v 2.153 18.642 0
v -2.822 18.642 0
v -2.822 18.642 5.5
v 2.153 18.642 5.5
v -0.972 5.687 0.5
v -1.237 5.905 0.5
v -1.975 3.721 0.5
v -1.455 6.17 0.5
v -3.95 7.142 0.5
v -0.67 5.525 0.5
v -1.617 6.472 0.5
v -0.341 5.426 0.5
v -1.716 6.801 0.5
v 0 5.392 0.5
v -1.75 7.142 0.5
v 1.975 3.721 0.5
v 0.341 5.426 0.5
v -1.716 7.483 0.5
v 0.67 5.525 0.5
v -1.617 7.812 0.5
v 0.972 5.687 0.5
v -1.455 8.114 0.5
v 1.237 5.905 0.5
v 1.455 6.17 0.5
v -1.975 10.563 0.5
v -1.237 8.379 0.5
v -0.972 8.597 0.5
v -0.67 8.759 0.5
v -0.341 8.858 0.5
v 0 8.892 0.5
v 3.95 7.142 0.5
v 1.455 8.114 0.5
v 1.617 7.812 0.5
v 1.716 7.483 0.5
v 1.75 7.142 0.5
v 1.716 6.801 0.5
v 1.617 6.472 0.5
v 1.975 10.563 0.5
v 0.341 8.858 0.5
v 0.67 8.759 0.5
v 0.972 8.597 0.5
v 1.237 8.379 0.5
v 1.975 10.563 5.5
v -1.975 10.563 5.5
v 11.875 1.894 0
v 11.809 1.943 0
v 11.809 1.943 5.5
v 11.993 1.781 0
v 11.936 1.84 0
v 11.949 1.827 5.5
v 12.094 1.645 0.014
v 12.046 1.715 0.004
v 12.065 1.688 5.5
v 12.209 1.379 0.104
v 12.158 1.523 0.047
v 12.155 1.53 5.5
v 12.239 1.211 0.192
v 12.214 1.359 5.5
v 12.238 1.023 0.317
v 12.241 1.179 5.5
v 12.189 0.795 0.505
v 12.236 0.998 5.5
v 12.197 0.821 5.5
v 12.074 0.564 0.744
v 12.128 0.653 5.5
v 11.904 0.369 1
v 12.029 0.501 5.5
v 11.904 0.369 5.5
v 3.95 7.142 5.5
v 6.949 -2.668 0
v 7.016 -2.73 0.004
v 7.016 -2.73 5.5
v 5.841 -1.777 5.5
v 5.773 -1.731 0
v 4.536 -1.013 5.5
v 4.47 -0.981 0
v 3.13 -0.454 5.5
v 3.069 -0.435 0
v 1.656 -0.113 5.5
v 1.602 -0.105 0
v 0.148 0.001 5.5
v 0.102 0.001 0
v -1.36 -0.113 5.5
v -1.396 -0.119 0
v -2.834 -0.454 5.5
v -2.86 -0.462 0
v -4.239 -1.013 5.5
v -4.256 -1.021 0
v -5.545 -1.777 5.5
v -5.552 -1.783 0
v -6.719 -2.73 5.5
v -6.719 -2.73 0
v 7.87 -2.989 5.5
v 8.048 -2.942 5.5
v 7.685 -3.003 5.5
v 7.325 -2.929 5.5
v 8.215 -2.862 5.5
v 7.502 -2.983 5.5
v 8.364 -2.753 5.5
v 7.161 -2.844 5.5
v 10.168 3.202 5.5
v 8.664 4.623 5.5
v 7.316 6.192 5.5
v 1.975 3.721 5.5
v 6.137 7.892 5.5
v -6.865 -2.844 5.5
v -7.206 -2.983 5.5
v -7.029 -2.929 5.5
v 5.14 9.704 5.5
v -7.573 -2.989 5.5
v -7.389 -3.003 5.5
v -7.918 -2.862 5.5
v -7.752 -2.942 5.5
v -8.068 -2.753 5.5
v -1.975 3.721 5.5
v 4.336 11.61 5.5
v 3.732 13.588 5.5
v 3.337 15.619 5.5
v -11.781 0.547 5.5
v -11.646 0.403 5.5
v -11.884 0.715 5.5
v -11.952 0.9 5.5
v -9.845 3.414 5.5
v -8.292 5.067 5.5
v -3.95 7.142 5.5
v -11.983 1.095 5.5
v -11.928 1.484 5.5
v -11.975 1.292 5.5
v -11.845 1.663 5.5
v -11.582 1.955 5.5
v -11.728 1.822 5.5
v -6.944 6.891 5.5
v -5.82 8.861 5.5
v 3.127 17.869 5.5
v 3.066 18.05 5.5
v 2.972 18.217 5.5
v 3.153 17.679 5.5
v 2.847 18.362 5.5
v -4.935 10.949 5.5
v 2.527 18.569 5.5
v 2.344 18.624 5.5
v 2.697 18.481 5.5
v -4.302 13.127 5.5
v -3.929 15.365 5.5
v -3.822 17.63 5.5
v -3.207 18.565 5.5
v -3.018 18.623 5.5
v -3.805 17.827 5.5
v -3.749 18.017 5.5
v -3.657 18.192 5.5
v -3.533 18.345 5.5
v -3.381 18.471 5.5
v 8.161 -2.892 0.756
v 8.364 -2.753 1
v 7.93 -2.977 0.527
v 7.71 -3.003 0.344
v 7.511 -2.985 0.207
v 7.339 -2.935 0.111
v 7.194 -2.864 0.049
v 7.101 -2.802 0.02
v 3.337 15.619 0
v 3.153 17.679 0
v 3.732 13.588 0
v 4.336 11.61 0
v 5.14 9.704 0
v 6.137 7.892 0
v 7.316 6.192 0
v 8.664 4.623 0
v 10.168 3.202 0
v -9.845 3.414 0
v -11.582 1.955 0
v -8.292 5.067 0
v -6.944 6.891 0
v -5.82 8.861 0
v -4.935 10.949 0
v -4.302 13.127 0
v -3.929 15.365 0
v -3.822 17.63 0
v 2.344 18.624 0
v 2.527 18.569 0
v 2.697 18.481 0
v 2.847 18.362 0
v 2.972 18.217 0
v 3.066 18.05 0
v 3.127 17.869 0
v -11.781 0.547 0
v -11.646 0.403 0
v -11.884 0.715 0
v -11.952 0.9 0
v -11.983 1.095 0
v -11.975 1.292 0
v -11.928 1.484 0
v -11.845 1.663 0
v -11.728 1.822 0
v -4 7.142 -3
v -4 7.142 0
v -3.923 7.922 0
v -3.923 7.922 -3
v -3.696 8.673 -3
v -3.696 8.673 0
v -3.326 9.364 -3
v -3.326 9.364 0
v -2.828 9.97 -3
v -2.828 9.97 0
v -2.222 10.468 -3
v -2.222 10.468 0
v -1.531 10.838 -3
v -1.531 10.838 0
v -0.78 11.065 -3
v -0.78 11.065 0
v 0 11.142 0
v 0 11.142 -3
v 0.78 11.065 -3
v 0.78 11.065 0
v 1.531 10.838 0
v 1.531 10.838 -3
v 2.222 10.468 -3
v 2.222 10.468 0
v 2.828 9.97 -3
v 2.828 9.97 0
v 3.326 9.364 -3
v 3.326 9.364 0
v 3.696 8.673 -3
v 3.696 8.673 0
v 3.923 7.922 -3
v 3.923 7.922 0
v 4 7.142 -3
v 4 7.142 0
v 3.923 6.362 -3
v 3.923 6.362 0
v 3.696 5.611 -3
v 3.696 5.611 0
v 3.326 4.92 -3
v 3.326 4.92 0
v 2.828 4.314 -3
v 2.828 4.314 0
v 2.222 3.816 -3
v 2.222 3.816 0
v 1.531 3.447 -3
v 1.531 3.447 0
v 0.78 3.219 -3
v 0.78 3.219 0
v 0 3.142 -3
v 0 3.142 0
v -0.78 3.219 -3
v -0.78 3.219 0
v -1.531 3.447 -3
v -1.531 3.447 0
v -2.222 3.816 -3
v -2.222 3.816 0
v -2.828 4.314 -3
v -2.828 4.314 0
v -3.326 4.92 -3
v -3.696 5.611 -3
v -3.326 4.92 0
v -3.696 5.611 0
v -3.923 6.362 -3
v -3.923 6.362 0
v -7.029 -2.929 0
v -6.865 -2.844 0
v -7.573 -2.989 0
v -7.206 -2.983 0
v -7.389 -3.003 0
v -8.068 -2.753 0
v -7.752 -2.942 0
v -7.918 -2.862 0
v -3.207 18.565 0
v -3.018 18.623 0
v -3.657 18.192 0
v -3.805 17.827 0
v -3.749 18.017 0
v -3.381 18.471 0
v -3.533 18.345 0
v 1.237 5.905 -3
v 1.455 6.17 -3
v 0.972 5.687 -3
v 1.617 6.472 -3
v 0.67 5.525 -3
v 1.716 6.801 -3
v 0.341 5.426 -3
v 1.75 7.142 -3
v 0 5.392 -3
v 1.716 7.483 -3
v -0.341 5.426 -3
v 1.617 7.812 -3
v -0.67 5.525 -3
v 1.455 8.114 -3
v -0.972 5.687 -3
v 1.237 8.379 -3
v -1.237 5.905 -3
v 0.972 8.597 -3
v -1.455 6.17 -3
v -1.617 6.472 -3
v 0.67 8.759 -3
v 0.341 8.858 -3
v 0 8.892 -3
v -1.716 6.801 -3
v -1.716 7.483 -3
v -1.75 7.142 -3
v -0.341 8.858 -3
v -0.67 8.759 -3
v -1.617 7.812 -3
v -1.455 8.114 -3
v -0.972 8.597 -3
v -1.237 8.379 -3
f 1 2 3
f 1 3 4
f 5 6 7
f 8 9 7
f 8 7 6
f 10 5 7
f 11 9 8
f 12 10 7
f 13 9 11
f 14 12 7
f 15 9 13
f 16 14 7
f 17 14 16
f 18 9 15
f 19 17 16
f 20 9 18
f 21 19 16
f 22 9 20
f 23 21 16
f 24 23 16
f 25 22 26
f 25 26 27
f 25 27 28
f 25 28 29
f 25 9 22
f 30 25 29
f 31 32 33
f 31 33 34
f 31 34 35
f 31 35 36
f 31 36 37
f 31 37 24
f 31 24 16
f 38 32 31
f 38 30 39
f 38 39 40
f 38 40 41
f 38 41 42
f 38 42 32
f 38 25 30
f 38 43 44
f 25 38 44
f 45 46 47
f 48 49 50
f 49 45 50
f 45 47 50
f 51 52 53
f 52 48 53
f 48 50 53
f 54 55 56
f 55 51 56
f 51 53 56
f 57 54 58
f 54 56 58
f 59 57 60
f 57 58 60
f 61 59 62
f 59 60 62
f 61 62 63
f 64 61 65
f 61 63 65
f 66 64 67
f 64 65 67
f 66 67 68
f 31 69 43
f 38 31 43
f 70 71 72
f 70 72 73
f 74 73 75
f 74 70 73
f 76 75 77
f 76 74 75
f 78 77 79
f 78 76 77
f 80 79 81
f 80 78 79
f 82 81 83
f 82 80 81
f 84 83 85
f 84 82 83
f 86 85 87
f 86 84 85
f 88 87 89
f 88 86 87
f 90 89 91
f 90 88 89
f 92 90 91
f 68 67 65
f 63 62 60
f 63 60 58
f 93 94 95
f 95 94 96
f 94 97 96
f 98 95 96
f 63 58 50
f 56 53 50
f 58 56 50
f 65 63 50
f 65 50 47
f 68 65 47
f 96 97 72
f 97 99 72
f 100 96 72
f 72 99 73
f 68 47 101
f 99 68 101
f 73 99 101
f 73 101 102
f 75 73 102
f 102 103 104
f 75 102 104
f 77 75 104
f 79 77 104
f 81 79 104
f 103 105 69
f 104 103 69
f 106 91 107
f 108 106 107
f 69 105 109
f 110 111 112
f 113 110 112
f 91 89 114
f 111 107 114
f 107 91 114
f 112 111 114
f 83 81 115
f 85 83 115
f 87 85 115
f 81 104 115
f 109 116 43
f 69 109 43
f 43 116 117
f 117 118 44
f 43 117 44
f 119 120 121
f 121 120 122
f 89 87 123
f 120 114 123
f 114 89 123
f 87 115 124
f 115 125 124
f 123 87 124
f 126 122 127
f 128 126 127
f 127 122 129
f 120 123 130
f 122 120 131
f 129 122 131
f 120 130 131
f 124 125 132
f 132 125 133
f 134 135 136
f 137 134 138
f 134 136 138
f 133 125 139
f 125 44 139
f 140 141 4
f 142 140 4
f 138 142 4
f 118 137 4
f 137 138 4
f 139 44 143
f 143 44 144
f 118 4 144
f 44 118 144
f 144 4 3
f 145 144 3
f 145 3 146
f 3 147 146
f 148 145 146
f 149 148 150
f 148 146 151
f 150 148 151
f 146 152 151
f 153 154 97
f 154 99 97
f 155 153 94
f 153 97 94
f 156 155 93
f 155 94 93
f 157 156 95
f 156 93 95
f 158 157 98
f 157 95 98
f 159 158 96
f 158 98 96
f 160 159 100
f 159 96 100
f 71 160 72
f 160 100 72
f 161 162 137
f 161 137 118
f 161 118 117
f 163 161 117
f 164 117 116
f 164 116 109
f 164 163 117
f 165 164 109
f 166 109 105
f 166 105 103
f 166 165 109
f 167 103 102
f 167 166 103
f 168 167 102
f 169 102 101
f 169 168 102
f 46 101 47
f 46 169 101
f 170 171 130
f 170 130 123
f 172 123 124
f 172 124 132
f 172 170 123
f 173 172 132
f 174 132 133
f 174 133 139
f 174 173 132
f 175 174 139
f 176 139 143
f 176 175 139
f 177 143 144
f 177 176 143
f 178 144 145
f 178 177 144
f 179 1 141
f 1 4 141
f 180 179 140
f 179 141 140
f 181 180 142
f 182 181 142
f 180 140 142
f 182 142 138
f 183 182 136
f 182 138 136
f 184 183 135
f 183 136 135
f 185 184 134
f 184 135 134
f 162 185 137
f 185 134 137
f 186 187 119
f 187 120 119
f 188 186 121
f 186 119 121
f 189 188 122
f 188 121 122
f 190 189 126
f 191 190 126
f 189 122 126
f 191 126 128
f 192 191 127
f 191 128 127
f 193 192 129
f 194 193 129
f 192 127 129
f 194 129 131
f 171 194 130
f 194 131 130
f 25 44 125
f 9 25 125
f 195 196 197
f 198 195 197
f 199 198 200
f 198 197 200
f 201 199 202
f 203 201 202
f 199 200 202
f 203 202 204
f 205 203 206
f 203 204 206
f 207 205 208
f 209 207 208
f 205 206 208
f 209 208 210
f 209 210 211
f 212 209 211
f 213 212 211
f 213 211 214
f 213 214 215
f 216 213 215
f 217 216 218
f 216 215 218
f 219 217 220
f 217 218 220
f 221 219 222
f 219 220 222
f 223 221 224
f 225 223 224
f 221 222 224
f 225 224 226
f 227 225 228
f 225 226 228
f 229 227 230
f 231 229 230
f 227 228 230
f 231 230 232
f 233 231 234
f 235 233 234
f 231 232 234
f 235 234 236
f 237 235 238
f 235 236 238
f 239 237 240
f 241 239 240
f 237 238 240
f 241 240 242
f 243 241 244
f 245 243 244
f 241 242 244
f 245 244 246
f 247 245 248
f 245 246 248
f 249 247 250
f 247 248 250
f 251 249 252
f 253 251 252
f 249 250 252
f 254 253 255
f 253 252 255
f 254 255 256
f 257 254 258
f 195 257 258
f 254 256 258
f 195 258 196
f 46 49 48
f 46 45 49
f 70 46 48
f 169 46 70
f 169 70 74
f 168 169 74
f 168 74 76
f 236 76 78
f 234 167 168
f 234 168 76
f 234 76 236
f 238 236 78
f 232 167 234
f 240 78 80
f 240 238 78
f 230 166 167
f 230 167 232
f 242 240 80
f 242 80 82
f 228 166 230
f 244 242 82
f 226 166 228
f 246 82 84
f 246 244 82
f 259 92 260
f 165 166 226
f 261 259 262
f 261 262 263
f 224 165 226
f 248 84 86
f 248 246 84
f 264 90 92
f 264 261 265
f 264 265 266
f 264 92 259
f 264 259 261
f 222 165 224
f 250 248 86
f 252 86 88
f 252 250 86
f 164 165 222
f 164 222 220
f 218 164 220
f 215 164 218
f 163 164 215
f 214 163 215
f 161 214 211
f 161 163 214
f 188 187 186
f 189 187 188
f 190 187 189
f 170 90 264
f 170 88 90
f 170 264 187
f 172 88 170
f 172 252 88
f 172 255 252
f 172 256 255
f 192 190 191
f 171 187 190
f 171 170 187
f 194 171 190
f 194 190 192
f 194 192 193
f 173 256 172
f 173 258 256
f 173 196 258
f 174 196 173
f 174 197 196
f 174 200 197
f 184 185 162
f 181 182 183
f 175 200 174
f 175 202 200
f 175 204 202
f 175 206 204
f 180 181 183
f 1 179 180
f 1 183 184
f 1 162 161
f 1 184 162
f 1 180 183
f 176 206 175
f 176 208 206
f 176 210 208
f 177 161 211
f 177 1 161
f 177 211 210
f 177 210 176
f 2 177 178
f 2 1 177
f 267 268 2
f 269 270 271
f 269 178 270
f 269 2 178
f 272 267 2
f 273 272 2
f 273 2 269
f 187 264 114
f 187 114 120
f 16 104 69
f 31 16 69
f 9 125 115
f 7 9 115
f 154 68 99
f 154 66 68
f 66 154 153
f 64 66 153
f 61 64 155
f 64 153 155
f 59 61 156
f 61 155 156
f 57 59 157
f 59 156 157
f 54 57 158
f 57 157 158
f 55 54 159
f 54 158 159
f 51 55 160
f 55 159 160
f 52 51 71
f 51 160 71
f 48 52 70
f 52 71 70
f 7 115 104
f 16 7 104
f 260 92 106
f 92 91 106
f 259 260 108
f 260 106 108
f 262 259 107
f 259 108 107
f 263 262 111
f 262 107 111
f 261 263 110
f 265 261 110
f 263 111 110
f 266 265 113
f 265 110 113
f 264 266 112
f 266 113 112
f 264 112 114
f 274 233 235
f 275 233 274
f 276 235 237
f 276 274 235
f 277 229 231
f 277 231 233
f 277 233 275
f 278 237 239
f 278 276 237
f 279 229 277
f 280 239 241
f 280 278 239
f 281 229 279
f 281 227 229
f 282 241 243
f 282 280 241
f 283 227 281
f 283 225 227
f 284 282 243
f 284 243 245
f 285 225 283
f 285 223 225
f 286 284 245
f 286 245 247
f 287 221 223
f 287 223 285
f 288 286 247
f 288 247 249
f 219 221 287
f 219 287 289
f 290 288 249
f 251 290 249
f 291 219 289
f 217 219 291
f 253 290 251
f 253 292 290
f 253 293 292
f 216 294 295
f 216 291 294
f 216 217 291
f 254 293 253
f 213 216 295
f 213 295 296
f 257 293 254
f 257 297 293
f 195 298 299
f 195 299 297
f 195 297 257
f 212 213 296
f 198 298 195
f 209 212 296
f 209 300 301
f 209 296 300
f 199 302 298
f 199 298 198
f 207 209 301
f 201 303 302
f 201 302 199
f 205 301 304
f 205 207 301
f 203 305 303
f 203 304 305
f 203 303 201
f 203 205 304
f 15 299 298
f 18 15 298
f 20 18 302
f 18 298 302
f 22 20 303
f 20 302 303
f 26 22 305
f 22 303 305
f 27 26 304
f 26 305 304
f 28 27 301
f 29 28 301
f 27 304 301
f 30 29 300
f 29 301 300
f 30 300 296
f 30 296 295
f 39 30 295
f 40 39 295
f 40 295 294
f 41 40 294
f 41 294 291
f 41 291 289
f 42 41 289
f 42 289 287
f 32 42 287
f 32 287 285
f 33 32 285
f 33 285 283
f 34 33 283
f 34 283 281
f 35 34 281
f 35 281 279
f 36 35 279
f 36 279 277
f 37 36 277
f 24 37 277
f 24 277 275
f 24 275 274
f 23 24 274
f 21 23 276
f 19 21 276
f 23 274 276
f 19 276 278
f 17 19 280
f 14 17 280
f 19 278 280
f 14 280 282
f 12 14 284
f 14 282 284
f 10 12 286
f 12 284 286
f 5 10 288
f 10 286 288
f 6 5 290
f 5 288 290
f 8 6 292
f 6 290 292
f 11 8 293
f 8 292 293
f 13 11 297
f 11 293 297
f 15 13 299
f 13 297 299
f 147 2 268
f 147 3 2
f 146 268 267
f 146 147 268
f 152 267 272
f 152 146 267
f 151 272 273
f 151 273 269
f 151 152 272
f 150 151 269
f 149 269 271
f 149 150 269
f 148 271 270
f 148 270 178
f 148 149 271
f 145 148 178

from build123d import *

# Parameters (mm, degrees)
BOSS_EXTRUDE1_DEPTH = 5.5
FILLET1_R           = 1
SKETCH2_R           = 4
BOSS_EXTRUDE2_DEPTH = 3
SKETCH3_R           = 1.75
CUT_EXTRUDE3_DEPTH  = 5
SKETCH4_R           = 1.75
CUT_EXTRUDE4_DEPTH  = 9.5000001


with BuildPart() as part:
    # Sketch1 → Boss-Extrude1 (new body)
    with BuildSketch(Plane.XY):
        with BuildLine():
            Line((-3.860140394, 18.642037645), (3.139859606, 18.642037645))
            ThreePointArc((3.139859606, 18.642037645), (5.695506545, 8.64046477), (12.898136912, 1.245540359))
            Line((12.898136912, 1.245540359), (7.648136912, -3.384524435))
            ThreePointArc((7.648136912, -3.384524435), (0.148136912, 0.001097287), (-7.351863088, -3.384524435))
            Line((-7.351863088, -3.384524435), (-12.601863088, 1.245540359))
            ThreePointArc((-12.601863088, 1.245540359), (-5.871247517, 8.758014837), (-3.860140394, 18.642037645))
        make_face()
    extrude(amount=BOSS_EXTRUDE1_DEPTH)

    # Fillet1
    fillet1_edges = [part.edges().sort_by_distance(p)[0] for p in [
        (-3.860140394, 18.642037645, 2.75),
        (3.139859606, 18.642037645, 2.75),
        (12.898136912, 1.245540359, 2.75),
        (7.648136912, -3.384524435, 2.75),
        (-7.351863088, -3.384524435, 2.75),
        (-12.601863088, 1.245540359, 2.75),
        (10.273136912, -1.069492038, 0),
    ]]
    fillet(fillet1_edges, radius=FILLET1_R)

    # Sketch2 → Boss-Extrude2 (add)
    with BuildSketch(Plane(origin=(0, 0, 0), x_dir=(-1, 0, 0), z_dir=(0, 0, -1))):
        with Locations((0, 7.142037645)):
            Circle(SKETCH2_R)
    extrude(amount=BOSS_EXTRUDE2_DEPTH)

    # Sketch3 → Cut-Extrude3 (cut)
    with BuildSketch(Plane.XY.offset(5.5)):
        Polygon((-3.95, 7.142037645), (-1.975, 3.7212373), (1.975, 3.7212373), (3.95, 7.142037645), (1.975, 10.56283799), (-1.975, 10.56283799), align=None)
        with Locations((0, 7.142037645)):
            Circle(SKETCH3_R, mode=Mode.SUBTRACT)
    extrude(amount=-CUT_EXTRUDE3_DEPTH, mode=Mode.SUBTRACT)

    # Sketch4 → Cut-Extrude4 (cut, through all)
    with BuildSketch(Plane(origin=(0, 0, -3), x_dir=(-1, 0, 0), z_dir=(0, 0, -1))):
        with Locations((0, 7.142037645)):
            Circle(SKETCH4_R)
    extrude(amount=-CUT_EXTRUDE4_DEPTH, mode=Mode.SUBTRACT)


solid = part.part
